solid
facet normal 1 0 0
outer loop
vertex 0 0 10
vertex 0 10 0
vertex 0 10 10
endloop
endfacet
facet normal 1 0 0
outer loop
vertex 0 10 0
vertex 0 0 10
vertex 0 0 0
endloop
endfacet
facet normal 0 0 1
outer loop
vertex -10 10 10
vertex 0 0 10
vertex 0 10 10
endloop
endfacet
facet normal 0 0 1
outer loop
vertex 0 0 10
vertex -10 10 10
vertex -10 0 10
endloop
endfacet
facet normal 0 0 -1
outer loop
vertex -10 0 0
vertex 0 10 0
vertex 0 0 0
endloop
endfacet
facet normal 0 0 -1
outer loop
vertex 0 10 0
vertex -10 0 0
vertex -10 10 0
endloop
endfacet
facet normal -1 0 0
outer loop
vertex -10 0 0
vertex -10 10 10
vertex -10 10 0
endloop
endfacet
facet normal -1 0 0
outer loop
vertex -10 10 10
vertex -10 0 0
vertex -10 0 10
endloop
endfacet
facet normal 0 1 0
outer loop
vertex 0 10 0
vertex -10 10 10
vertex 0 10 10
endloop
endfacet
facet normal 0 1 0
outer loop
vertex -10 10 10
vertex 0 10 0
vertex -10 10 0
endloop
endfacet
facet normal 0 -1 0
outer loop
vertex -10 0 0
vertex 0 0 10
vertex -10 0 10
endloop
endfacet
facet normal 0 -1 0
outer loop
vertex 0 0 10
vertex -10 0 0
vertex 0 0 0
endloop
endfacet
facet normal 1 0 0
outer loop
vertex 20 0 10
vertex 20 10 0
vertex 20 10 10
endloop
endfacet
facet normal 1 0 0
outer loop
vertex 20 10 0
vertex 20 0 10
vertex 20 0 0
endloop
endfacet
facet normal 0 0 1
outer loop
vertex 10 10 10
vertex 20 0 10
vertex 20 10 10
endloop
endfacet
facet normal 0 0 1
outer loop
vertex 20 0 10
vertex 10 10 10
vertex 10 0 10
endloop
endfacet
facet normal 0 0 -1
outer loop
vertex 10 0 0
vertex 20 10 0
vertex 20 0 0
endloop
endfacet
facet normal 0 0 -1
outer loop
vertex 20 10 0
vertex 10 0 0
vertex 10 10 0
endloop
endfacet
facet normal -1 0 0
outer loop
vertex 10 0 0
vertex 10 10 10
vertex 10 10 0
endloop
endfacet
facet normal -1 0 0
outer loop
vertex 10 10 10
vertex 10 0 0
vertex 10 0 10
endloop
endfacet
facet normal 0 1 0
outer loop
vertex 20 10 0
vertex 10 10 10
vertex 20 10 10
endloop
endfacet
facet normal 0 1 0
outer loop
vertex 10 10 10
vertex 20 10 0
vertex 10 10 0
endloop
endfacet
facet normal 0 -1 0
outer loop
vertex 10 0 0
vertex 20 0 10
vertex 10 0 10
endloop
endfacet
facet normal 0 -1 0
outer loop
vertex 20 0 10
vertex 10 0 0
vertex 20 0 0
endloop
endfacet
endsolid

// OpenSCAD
// Two distinct colors with different alphas, so the exported stage exercises material
// interning, per-color mesh splitting and opacity.
color([1, 0.5, 0.25, 0.125]) translate([-10, 0, 0]) cube(10);
color("green") translate([10, 0, 0]) cube(10);
